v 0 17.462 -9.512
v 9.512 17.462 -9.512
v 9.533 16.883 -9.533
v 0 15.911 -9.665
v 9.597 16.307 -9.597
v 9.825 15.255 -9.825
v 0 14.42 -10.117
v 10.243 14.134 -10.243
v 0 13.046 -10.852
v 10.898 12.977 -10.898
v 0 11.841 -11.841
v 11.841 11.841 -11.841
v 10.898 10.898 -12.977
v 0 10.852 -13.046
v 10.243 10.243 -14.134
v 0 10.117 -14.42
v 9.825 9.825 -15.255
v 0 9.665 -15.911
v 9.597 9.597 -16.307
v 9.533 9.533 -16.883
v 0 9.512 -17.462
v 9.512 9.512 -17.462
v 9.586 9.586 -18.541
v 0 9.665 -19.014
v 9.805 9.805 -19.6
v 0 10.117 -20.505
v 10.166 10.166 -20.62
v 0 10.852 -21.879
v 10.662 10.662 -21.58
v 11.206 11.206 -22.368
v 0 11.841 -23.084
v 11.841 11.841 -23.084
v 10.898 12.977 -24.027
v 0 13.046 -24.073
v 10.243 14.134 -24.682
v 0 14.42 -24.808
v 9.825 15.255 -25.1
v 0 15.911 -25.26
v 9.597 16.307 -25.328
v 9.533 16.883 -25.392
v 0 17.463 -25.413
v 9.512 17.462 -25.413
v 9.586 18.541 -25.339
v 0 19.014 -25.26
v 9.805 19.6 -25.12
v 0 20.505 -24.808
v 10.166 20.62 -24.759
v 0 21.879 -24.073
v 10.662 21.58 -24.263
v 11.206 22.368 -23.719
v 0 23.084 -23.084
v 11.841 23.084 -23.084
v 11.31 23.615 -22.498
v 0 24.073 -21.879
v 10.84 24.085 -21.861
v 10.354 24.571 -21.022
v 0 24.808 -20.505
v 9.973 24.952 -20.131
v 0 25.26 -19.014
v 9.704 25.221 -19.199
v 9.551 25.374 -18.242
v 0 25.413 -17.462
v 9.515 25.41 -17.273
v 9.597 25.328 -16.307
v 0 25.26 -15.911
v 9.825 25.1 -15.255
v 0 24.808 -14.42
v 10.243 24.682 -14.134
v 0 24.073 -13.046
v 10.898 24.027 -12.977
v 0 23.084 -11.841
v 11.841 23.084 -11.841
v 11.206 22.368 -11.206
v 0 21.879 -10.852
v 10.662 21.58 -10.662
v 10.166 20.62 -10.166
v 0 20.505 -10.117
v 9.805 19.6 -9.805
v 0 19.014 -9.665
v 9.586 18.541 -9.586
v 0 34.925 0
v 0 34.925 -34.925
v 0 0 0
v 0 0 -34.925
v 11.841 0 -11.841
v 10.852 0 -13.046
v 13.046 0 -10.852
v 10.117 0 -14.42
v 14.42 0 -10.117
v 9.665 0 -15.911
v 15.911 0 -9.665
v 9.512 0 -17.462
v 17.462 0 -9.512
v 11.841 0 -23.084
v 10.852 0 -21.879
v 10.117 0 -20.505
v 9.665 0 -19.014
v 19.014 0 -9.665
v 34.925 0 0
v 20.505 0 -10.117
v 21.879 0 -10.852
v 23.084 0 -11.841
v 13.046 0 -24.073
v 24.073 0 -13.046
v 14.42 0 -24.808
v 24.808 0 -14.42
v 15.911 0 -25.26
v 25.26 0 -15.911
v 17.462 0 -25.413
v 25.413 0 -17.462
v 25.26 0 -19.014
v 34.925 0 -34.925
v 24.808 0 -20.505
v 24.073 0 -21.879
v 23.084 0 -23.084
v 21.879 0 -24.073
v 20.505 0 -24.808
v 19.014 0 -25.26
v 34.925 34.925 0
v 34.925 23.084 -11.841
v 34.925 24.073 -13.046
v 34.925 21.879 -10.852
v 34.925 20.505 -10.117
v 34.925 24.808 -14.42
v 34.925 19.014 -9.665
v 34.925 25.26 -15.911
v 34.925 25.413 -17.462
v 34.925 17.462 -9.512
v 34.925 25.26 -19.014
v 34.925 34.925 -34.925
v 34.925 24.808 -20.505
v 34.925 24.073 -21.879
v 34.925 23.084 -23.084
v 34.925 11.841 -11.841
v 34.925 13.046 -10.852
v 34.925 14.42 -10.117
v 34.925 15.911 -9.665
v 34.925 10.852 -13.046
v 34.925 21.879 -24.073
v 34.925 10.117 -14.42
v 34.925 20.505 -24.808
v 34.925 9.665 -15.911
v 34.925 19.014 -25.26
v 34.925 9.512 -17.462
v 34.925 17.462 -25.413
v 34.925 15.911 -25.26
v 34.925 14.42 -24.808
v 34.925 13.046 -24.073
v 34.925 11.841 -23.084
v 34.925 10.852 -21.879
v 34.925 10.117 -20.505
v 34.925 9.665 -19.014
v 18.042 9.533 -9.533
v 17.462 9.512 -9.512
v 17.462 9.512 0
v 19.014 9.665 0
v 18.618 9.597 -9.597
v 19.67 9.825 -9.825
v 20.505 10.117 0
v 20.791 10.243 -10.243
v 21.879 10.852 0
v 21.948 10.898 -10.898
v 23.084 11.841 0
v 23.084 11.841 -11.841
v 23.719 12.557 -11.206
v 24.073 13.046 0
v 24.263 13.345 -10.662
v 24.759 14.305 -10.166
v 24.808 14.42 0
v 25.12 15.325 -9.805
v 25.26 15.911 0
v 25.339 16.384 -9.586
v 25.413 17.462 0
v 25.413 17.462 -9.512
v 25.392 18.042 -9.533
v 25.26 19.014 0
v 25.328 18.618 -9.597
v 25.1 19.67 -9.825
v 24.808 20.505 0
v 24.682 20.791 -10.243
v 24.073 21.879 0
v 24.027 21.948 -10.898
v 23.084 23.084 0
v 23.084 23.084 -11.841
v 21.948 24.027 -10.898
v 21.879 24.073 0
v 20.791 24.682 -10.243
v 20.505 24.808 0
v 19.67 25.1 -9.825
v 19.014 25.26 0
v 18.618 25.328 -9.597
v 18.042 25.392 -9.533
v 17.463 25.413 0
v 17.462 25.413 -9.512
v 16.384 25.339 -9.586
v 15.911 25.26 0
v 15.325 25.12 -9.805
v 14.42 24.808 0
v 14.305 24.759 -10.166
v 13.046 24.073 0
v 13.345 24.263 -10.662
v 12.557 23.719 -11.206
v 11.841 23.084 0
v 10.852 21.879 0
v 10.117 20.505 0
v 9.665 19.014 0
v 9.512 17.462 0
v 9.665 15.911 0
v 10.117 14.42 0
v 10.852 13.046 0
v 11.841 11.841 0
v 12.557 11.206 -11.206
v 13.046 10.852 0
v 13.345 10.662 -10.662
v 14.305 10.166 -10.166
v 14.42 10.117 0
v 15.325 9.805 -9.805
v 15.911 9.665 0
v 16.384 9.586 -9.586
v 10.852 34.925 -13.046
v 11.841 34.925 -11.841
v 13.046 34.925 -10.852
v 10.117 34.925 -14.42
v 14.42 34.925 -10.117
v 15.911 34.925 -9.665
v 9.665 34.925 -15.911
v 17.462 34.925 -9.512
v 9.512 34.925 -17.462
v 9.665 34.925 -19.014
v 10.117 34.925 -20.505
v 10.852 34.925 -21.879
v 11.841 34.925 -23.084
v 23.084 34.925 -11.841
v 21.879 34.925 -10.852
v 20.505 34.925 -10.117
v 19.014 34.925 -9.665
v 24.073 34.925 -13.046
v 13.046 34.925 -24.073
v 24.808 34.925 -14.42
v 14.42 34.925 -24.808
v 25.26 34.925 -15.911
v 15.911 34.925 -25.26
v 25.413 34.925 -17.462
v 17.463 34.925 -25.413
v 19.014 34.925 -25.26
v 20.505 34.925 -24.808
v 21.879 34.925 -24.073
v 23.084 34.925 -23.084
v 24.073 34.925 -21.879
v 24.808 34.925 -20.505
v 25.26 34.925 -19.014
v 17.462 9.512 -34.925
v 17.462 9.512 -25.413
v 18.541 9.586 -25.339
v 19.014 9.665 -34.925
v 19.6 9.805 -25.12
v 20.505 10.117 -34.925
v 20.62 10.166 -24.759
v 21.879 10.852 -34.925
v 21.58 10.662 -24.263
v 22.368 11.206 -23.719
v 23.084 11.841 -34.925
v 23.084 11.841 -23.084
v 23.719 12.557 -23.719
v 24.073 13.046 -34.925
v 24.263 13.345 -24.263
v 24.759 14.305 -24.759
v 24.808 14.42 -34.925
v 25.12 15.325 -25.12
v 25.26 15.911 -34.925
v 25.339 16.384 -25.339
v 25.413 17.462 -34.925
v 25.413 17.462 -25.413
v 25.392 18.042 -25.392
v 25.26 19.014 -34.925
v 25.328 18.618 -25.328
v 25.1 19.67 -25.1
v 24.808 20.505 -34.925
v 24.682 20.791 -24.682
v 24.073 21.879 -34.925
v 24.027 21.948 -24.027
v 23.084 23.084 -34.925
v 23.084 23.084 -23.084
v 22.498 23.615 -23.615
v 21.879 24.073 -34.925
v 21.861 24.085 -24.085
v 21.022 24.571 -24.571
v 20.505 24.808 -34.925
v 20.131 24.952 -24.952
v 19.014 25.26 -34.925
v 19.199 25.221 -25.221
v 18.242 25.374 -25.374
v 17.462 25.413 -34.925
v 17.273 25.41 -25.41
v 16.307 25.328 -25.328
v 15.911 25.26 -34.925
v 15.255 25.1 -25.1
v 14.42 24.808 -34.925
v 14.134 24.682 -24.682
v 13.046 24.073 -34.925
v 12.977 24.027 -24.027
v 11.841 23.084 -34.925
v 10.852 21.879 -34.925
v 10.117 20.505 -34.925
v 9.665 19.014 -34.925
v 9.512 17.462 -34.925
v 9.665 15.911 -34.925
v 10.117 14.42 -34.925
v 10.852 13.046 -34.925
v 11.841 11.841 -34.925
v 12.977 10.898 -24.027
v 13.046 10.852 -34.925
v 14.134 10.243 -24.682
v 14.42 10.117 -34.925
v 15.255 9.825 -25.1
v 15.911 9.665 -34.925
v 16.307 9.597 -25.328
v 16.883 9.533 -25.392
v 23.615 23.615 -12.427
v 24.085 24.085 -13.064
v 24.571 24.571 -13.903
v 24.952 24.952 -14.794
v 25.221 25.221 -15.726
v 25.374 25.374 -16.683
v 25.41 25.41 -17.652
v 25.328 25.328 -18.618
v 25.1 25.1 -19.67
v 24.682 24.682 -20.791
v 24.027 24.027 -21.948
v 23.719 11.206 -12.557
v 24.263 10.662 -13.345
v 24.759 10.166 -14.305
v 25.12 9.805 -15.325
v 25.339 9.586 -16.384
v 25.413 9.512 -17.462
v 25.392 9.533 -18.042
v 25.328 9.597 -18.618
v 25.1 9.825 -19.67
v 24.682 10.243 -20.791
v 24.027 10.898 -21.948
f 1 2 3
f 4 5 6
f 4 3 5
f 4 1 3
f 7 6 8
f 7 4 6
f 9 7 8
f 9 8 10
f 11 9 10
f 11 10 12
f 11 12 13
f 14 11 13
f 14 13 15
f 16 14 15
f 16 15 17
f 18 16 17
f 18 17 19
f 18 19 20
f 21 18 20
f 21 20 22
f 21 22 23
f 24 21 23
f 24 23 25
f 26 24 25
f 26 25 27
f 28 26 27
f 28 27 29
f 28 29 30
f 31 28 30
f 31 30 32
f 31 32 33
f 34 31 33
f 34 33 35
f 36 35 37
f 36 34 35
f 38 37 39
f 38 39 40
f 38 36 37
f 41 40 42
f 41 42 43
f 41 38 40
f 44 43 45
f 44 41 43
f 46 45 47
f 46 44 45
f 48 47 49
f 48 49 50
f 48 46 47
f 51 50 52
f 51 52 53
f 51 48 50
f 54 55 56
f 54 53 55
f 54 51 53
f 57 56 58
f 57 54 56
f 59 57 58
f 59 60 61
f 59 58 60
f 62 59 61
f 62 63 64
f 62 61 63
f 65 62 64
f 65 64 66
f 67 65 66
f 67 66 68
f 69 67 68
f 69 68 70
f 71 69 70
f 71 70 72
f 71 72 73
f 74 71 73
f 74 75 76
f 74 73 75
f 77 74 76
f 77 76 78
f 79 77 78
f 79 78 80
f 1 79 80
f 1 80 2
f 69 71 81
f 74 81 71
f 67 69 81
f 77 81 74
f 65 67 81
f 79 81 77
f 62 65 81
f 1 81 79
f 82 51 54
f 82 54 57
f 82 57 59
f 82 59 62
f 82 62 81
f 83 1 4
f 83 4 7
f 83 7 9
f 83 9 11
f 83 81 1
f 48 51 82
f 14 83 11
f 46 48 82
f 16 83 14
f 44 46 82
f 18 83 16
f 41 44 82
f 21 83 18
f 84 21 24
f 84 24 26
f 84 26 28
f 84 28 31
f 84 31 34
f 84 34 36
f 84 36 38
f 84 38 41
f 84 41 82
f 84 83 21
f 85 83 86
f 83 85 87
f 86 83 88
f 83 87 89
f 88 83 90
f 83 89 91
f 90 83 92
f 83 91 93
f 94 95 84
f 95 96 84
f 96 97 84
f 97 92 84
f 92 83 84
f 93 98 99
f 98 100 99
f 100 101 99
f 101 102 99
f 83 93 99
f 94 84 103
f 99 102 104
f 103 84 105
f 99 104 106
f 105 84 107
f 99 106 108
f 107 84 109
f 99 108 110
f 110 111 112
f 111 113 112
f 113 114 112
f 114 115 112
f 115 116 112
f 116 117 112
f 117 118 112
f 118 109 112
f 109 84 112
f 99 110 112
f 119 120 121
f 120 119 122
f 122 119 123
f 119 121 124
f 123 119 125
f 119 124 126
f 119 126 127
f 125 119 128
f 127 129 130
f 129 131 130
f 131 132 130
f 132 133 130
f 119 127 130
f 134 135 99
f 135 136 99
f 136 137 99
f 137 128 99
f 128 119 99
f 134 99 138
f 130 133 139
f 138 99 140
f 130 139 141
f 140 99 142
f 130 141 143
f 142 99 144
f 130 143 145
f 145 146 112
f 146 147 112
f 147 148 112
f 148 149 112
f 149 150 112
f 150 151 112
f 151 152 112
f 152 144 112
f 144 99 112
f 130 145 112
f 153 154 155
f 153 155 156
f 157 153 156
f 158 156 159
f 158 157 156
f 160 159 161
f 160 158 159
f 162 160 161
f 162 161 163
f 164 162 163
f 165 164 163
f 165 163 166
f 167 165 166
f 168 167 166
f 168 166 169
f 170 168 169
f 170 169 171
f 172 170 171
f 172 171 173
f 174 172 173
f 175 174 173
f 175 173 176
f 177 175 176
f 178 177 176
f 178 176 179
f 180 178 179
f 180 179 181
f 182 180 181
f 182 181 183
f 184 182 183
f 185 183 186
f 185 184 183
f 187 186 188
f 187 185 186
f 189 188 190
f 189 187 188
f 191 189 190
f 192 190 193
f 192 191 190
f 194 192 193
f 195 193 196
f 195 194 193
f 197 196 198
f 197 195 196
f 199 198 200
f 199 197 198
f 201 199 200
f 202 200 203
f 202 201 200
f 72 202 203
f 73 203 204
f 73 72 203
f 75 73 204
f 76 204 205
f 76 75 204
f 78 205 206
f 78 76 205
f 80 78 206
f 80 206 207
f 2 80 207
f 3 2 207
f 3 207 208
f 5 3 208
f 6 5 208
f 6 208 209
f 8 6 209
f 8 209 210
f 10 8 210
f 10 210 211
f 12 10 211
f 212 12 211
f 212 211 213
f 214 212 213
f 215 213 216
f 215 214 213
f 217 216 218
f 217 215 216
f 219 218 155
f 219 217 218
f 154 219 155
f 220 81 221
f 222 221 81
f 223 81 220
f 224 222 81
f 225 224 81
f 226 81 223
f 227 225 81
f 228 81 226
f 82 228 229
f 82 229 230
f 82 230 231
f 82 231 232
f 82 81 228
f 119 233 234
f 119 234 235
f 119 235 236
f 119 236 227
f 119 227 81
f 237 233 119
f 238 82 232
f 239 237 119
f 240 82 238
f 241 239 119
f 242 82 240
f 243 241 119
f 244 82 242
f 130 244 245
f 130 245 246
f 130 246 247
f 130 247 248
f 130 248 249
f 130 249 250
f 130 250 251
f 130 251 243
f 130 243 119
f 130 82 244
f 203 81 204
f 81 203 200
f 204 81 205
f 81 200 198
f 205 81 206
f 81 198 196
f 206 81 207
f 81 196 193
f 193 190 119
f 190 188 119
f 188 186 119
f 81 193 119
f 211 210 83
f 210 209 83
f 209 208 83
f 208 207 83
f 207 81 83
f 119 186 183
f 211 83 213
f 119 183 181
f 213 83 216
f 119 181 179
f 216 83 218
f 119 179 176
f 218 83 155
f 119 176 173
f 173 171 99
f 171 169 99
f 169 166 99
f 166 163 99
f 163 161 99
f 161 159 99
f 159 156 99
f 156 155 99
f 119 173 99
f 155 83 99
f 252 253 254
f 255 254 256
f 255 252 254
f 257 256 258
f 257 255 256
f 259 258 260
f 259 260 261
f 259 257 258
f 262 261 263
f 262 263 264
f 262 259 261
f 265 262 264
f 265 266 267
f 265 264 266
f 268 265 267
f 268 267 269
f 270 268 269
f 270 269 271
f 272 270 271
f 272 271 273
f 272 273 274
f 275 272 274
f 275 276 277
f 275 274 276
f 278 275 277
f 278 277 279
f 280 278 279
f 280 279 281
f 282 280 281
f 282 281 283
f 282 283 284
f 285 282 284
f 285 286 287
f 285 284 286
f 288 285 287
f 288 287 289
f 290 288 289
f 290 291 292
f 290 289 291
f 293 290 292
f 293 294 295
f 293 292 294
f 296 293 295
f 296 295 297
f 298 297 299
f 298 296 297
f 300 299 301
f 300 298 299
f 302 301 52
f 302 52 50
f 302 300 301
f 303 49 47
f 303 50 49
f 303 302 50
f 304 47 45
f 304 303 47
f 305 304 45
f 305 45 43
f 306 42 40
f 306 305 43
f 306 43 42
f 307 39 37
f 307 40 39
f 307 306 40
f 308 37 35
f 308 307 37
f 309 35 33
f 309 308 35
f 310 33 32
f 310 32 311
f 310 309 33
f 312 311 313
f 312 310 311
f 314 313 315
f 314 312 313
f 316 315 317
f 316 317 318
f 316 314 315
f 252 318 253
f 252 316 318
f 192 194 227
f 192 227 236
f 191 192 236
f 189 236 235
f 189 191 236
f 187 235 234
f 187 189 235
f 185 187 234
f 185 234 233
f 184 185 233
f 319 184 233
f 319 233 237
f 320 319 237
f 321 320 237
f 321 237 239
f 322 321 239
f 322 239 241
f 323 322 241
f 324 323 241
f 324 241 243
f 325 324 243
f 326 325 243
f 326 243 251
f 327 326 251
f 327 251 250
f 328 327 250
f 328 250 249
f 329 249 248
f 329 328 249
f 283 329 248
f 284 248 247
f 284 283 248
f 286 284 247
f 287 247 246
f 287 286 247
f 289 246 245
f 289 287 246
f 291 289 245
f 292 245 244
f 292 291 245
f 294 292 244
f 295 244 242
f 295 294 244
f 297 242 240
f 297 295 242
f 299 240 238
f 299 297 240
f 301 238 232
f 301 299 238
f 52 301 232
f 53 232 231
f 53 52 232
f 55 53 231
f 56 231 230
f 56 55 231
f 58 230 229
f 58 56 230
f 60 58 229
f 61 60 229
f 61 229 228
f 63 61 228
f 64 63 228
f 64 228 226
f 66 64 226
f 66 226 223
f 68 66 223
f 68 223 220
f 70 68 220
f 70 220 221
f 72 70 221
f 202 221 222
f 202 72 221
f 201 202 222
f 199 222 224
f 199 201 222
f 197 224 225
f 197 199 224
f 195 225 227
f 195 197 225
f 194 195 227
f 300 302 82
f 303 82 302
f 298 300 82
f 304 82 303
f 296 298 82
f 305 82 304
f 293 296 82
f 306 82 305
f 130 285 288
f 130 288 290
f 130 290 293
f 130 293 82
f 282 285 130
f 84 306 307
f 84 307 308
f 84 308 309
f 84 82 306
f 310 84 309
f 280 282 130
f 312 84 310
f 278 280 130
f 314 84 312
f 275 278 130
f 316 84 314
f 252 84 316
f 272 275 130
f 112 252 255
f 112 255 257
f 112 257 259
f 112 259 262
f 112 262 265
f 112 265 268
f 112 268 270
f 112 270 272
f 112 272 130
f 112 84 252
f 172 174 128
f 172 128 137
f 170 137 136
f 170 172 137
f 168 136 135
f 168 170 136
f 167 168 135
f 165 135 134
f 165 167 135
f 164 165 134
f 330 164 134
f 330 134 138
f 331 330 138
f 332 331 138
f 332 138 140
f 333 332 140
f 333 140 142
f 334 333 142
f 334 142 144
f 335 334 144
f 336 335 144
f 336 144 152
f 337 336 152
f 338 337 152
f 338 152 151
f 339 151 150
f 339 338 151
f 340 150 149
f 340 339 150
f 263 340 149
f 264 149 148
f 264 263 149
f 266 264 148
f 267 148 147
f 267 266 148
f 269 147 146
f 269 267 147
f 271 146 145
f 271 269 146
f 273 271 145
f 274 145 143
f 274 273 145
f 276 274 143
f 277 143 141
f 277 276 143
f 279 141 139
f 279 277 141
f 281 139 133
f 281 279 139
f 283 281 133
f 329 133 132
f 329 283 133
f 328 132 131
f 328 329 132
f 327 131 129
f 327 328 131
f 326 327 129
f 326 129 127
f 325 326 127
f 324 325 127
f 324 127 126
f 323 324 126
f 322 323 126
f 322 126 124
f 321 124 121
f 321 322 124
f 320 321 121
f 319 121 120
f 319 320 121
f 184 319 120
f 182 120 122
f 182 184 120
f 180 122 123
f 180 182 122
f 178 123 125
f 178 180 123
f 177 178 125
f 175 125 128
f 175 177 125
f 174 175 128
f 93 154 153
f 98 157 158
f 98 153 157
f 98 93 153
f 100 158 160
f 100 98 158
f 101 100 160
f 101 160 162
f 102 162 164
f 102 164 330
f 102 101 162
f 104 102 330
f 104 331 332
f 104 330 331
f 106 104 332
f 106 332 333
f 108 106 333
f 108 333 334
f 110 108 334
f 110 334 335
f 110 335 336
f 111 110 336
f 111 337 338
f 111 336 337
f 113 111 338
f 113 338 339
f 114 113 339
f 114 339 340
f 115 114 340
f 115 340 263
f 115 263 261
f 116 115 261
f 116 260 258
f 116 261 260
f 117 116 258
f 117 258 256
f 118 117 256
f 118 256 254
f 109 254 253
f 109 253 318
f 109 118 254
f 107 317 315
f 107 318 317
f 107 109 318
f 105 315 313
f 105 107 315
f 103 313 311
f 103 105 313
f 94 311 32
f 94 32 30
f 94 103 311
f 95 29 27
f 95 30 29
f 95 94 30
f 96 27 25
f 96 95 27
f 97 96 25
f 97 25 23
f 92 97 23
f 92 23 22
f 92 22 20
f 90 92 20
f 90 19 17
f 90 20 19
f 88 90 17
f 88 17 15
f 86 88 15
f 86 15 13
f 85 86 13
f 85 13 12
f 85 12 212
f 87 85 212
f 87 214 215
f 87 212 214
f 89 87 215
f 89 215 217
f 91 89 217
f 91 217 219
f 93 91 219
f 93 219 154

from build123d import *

# Parameters (mm, degrees)
SKETCH1_W                   = 34.925
SKETCH1_H                   = 34.925
CUBE_DEPTH                  = 34.925
SKETCH1_3_R                 = 7.9502
CUT_EXTRUDE1_DEPTH          = 61.491874454
CIRPATTERN2_COUNT           = 2
CIRPATTERN2_ANGLE           = 90
CIRPATTERN3_COPY_1_SKETCH_R = 7.9502
CIRPATTERN3_COPY_1_DEPTH    = 61.491874454
CIRPATTERN3_COPY_2_SKETCH_R = 7.9502
CIRPATTERN3_COPY_2_DEPTH    = 61.491874454


with BuildPart() as part:
    # Sketch1 → Cube (new body)
    with BuildSketch(Plane(origin=(0, 0, 0), x_dir=(1, 0, 0), z_dir=(0, 1, 0))):
        with Locations((17.4625, 17.4625)):
            Rectangle(SKETCH1_W, SKETCH1_H)
    extrude(amount=CUBE_DEPTH)

    # Sketch1<3> → Cut-Extrude1 (cut, through all)
    with BuildSketch(Plane(origin=(0, 0, 0), x_dir=(1, 0, 0), z_dir=(0, 1, 0))):
        with Locations((17.4625, 17.4625)):
            Circle(SKETCH1_3_R)
    cut_extrude1 = extrude(amount=CUT_EXTRUDE1_DEPTH, mode=Mode.SUBTRACT)

    # CirPattern2: Cut-Extrude1 ×2 about axis
    cirpattern2_axis = Axis((-1.74625, 17.4625, -17.4625), (1, 0, 0))
    for i in range(1, CIRPATTERN2_COUNT):
        add(cut_extrude1.rotate(cirpattern2_axis, i * CIRPATTERN2_ANGLE / (CIRPATTERN2_COUNT - 1)), mode=Mode.SUBTRACT)

    # CirPattern3 copy 1 sketch → CirPattern3 copy 1 (cut, through all)
    with BuildSketch(Plane(origin=(0, 34.925, -34.925), x_dir=(0, -1, 0), z_dir=(0, 0, 1))):
        with Locations((17.4625, 17.4625)):
            Circle(CIRPATTERN3_COPY_1_SKETCH_R)
    extrude(amount=CIRPATTERN3_COPY_1_DEPTH, mode=Mode.SUBTRACT)

    # CirPattern3 copy 2 sketch → CirPattern3 copy 2 (cut, through all)
    with BuildSketch(Plane(origin=(0, 34.925, 0), x_dir=(0, -1, 0), z_dir=(1, 0, 0))):
        with Locations((17.4625, 17.4625)):
            Circle(CIRPATTERN3_COPY_2_SKETCH_R)
    extrude(amount=CIRPATTERN3_COPY_2_DEPTH, mode=Mode.SUBTRACT)


solid = part.part
